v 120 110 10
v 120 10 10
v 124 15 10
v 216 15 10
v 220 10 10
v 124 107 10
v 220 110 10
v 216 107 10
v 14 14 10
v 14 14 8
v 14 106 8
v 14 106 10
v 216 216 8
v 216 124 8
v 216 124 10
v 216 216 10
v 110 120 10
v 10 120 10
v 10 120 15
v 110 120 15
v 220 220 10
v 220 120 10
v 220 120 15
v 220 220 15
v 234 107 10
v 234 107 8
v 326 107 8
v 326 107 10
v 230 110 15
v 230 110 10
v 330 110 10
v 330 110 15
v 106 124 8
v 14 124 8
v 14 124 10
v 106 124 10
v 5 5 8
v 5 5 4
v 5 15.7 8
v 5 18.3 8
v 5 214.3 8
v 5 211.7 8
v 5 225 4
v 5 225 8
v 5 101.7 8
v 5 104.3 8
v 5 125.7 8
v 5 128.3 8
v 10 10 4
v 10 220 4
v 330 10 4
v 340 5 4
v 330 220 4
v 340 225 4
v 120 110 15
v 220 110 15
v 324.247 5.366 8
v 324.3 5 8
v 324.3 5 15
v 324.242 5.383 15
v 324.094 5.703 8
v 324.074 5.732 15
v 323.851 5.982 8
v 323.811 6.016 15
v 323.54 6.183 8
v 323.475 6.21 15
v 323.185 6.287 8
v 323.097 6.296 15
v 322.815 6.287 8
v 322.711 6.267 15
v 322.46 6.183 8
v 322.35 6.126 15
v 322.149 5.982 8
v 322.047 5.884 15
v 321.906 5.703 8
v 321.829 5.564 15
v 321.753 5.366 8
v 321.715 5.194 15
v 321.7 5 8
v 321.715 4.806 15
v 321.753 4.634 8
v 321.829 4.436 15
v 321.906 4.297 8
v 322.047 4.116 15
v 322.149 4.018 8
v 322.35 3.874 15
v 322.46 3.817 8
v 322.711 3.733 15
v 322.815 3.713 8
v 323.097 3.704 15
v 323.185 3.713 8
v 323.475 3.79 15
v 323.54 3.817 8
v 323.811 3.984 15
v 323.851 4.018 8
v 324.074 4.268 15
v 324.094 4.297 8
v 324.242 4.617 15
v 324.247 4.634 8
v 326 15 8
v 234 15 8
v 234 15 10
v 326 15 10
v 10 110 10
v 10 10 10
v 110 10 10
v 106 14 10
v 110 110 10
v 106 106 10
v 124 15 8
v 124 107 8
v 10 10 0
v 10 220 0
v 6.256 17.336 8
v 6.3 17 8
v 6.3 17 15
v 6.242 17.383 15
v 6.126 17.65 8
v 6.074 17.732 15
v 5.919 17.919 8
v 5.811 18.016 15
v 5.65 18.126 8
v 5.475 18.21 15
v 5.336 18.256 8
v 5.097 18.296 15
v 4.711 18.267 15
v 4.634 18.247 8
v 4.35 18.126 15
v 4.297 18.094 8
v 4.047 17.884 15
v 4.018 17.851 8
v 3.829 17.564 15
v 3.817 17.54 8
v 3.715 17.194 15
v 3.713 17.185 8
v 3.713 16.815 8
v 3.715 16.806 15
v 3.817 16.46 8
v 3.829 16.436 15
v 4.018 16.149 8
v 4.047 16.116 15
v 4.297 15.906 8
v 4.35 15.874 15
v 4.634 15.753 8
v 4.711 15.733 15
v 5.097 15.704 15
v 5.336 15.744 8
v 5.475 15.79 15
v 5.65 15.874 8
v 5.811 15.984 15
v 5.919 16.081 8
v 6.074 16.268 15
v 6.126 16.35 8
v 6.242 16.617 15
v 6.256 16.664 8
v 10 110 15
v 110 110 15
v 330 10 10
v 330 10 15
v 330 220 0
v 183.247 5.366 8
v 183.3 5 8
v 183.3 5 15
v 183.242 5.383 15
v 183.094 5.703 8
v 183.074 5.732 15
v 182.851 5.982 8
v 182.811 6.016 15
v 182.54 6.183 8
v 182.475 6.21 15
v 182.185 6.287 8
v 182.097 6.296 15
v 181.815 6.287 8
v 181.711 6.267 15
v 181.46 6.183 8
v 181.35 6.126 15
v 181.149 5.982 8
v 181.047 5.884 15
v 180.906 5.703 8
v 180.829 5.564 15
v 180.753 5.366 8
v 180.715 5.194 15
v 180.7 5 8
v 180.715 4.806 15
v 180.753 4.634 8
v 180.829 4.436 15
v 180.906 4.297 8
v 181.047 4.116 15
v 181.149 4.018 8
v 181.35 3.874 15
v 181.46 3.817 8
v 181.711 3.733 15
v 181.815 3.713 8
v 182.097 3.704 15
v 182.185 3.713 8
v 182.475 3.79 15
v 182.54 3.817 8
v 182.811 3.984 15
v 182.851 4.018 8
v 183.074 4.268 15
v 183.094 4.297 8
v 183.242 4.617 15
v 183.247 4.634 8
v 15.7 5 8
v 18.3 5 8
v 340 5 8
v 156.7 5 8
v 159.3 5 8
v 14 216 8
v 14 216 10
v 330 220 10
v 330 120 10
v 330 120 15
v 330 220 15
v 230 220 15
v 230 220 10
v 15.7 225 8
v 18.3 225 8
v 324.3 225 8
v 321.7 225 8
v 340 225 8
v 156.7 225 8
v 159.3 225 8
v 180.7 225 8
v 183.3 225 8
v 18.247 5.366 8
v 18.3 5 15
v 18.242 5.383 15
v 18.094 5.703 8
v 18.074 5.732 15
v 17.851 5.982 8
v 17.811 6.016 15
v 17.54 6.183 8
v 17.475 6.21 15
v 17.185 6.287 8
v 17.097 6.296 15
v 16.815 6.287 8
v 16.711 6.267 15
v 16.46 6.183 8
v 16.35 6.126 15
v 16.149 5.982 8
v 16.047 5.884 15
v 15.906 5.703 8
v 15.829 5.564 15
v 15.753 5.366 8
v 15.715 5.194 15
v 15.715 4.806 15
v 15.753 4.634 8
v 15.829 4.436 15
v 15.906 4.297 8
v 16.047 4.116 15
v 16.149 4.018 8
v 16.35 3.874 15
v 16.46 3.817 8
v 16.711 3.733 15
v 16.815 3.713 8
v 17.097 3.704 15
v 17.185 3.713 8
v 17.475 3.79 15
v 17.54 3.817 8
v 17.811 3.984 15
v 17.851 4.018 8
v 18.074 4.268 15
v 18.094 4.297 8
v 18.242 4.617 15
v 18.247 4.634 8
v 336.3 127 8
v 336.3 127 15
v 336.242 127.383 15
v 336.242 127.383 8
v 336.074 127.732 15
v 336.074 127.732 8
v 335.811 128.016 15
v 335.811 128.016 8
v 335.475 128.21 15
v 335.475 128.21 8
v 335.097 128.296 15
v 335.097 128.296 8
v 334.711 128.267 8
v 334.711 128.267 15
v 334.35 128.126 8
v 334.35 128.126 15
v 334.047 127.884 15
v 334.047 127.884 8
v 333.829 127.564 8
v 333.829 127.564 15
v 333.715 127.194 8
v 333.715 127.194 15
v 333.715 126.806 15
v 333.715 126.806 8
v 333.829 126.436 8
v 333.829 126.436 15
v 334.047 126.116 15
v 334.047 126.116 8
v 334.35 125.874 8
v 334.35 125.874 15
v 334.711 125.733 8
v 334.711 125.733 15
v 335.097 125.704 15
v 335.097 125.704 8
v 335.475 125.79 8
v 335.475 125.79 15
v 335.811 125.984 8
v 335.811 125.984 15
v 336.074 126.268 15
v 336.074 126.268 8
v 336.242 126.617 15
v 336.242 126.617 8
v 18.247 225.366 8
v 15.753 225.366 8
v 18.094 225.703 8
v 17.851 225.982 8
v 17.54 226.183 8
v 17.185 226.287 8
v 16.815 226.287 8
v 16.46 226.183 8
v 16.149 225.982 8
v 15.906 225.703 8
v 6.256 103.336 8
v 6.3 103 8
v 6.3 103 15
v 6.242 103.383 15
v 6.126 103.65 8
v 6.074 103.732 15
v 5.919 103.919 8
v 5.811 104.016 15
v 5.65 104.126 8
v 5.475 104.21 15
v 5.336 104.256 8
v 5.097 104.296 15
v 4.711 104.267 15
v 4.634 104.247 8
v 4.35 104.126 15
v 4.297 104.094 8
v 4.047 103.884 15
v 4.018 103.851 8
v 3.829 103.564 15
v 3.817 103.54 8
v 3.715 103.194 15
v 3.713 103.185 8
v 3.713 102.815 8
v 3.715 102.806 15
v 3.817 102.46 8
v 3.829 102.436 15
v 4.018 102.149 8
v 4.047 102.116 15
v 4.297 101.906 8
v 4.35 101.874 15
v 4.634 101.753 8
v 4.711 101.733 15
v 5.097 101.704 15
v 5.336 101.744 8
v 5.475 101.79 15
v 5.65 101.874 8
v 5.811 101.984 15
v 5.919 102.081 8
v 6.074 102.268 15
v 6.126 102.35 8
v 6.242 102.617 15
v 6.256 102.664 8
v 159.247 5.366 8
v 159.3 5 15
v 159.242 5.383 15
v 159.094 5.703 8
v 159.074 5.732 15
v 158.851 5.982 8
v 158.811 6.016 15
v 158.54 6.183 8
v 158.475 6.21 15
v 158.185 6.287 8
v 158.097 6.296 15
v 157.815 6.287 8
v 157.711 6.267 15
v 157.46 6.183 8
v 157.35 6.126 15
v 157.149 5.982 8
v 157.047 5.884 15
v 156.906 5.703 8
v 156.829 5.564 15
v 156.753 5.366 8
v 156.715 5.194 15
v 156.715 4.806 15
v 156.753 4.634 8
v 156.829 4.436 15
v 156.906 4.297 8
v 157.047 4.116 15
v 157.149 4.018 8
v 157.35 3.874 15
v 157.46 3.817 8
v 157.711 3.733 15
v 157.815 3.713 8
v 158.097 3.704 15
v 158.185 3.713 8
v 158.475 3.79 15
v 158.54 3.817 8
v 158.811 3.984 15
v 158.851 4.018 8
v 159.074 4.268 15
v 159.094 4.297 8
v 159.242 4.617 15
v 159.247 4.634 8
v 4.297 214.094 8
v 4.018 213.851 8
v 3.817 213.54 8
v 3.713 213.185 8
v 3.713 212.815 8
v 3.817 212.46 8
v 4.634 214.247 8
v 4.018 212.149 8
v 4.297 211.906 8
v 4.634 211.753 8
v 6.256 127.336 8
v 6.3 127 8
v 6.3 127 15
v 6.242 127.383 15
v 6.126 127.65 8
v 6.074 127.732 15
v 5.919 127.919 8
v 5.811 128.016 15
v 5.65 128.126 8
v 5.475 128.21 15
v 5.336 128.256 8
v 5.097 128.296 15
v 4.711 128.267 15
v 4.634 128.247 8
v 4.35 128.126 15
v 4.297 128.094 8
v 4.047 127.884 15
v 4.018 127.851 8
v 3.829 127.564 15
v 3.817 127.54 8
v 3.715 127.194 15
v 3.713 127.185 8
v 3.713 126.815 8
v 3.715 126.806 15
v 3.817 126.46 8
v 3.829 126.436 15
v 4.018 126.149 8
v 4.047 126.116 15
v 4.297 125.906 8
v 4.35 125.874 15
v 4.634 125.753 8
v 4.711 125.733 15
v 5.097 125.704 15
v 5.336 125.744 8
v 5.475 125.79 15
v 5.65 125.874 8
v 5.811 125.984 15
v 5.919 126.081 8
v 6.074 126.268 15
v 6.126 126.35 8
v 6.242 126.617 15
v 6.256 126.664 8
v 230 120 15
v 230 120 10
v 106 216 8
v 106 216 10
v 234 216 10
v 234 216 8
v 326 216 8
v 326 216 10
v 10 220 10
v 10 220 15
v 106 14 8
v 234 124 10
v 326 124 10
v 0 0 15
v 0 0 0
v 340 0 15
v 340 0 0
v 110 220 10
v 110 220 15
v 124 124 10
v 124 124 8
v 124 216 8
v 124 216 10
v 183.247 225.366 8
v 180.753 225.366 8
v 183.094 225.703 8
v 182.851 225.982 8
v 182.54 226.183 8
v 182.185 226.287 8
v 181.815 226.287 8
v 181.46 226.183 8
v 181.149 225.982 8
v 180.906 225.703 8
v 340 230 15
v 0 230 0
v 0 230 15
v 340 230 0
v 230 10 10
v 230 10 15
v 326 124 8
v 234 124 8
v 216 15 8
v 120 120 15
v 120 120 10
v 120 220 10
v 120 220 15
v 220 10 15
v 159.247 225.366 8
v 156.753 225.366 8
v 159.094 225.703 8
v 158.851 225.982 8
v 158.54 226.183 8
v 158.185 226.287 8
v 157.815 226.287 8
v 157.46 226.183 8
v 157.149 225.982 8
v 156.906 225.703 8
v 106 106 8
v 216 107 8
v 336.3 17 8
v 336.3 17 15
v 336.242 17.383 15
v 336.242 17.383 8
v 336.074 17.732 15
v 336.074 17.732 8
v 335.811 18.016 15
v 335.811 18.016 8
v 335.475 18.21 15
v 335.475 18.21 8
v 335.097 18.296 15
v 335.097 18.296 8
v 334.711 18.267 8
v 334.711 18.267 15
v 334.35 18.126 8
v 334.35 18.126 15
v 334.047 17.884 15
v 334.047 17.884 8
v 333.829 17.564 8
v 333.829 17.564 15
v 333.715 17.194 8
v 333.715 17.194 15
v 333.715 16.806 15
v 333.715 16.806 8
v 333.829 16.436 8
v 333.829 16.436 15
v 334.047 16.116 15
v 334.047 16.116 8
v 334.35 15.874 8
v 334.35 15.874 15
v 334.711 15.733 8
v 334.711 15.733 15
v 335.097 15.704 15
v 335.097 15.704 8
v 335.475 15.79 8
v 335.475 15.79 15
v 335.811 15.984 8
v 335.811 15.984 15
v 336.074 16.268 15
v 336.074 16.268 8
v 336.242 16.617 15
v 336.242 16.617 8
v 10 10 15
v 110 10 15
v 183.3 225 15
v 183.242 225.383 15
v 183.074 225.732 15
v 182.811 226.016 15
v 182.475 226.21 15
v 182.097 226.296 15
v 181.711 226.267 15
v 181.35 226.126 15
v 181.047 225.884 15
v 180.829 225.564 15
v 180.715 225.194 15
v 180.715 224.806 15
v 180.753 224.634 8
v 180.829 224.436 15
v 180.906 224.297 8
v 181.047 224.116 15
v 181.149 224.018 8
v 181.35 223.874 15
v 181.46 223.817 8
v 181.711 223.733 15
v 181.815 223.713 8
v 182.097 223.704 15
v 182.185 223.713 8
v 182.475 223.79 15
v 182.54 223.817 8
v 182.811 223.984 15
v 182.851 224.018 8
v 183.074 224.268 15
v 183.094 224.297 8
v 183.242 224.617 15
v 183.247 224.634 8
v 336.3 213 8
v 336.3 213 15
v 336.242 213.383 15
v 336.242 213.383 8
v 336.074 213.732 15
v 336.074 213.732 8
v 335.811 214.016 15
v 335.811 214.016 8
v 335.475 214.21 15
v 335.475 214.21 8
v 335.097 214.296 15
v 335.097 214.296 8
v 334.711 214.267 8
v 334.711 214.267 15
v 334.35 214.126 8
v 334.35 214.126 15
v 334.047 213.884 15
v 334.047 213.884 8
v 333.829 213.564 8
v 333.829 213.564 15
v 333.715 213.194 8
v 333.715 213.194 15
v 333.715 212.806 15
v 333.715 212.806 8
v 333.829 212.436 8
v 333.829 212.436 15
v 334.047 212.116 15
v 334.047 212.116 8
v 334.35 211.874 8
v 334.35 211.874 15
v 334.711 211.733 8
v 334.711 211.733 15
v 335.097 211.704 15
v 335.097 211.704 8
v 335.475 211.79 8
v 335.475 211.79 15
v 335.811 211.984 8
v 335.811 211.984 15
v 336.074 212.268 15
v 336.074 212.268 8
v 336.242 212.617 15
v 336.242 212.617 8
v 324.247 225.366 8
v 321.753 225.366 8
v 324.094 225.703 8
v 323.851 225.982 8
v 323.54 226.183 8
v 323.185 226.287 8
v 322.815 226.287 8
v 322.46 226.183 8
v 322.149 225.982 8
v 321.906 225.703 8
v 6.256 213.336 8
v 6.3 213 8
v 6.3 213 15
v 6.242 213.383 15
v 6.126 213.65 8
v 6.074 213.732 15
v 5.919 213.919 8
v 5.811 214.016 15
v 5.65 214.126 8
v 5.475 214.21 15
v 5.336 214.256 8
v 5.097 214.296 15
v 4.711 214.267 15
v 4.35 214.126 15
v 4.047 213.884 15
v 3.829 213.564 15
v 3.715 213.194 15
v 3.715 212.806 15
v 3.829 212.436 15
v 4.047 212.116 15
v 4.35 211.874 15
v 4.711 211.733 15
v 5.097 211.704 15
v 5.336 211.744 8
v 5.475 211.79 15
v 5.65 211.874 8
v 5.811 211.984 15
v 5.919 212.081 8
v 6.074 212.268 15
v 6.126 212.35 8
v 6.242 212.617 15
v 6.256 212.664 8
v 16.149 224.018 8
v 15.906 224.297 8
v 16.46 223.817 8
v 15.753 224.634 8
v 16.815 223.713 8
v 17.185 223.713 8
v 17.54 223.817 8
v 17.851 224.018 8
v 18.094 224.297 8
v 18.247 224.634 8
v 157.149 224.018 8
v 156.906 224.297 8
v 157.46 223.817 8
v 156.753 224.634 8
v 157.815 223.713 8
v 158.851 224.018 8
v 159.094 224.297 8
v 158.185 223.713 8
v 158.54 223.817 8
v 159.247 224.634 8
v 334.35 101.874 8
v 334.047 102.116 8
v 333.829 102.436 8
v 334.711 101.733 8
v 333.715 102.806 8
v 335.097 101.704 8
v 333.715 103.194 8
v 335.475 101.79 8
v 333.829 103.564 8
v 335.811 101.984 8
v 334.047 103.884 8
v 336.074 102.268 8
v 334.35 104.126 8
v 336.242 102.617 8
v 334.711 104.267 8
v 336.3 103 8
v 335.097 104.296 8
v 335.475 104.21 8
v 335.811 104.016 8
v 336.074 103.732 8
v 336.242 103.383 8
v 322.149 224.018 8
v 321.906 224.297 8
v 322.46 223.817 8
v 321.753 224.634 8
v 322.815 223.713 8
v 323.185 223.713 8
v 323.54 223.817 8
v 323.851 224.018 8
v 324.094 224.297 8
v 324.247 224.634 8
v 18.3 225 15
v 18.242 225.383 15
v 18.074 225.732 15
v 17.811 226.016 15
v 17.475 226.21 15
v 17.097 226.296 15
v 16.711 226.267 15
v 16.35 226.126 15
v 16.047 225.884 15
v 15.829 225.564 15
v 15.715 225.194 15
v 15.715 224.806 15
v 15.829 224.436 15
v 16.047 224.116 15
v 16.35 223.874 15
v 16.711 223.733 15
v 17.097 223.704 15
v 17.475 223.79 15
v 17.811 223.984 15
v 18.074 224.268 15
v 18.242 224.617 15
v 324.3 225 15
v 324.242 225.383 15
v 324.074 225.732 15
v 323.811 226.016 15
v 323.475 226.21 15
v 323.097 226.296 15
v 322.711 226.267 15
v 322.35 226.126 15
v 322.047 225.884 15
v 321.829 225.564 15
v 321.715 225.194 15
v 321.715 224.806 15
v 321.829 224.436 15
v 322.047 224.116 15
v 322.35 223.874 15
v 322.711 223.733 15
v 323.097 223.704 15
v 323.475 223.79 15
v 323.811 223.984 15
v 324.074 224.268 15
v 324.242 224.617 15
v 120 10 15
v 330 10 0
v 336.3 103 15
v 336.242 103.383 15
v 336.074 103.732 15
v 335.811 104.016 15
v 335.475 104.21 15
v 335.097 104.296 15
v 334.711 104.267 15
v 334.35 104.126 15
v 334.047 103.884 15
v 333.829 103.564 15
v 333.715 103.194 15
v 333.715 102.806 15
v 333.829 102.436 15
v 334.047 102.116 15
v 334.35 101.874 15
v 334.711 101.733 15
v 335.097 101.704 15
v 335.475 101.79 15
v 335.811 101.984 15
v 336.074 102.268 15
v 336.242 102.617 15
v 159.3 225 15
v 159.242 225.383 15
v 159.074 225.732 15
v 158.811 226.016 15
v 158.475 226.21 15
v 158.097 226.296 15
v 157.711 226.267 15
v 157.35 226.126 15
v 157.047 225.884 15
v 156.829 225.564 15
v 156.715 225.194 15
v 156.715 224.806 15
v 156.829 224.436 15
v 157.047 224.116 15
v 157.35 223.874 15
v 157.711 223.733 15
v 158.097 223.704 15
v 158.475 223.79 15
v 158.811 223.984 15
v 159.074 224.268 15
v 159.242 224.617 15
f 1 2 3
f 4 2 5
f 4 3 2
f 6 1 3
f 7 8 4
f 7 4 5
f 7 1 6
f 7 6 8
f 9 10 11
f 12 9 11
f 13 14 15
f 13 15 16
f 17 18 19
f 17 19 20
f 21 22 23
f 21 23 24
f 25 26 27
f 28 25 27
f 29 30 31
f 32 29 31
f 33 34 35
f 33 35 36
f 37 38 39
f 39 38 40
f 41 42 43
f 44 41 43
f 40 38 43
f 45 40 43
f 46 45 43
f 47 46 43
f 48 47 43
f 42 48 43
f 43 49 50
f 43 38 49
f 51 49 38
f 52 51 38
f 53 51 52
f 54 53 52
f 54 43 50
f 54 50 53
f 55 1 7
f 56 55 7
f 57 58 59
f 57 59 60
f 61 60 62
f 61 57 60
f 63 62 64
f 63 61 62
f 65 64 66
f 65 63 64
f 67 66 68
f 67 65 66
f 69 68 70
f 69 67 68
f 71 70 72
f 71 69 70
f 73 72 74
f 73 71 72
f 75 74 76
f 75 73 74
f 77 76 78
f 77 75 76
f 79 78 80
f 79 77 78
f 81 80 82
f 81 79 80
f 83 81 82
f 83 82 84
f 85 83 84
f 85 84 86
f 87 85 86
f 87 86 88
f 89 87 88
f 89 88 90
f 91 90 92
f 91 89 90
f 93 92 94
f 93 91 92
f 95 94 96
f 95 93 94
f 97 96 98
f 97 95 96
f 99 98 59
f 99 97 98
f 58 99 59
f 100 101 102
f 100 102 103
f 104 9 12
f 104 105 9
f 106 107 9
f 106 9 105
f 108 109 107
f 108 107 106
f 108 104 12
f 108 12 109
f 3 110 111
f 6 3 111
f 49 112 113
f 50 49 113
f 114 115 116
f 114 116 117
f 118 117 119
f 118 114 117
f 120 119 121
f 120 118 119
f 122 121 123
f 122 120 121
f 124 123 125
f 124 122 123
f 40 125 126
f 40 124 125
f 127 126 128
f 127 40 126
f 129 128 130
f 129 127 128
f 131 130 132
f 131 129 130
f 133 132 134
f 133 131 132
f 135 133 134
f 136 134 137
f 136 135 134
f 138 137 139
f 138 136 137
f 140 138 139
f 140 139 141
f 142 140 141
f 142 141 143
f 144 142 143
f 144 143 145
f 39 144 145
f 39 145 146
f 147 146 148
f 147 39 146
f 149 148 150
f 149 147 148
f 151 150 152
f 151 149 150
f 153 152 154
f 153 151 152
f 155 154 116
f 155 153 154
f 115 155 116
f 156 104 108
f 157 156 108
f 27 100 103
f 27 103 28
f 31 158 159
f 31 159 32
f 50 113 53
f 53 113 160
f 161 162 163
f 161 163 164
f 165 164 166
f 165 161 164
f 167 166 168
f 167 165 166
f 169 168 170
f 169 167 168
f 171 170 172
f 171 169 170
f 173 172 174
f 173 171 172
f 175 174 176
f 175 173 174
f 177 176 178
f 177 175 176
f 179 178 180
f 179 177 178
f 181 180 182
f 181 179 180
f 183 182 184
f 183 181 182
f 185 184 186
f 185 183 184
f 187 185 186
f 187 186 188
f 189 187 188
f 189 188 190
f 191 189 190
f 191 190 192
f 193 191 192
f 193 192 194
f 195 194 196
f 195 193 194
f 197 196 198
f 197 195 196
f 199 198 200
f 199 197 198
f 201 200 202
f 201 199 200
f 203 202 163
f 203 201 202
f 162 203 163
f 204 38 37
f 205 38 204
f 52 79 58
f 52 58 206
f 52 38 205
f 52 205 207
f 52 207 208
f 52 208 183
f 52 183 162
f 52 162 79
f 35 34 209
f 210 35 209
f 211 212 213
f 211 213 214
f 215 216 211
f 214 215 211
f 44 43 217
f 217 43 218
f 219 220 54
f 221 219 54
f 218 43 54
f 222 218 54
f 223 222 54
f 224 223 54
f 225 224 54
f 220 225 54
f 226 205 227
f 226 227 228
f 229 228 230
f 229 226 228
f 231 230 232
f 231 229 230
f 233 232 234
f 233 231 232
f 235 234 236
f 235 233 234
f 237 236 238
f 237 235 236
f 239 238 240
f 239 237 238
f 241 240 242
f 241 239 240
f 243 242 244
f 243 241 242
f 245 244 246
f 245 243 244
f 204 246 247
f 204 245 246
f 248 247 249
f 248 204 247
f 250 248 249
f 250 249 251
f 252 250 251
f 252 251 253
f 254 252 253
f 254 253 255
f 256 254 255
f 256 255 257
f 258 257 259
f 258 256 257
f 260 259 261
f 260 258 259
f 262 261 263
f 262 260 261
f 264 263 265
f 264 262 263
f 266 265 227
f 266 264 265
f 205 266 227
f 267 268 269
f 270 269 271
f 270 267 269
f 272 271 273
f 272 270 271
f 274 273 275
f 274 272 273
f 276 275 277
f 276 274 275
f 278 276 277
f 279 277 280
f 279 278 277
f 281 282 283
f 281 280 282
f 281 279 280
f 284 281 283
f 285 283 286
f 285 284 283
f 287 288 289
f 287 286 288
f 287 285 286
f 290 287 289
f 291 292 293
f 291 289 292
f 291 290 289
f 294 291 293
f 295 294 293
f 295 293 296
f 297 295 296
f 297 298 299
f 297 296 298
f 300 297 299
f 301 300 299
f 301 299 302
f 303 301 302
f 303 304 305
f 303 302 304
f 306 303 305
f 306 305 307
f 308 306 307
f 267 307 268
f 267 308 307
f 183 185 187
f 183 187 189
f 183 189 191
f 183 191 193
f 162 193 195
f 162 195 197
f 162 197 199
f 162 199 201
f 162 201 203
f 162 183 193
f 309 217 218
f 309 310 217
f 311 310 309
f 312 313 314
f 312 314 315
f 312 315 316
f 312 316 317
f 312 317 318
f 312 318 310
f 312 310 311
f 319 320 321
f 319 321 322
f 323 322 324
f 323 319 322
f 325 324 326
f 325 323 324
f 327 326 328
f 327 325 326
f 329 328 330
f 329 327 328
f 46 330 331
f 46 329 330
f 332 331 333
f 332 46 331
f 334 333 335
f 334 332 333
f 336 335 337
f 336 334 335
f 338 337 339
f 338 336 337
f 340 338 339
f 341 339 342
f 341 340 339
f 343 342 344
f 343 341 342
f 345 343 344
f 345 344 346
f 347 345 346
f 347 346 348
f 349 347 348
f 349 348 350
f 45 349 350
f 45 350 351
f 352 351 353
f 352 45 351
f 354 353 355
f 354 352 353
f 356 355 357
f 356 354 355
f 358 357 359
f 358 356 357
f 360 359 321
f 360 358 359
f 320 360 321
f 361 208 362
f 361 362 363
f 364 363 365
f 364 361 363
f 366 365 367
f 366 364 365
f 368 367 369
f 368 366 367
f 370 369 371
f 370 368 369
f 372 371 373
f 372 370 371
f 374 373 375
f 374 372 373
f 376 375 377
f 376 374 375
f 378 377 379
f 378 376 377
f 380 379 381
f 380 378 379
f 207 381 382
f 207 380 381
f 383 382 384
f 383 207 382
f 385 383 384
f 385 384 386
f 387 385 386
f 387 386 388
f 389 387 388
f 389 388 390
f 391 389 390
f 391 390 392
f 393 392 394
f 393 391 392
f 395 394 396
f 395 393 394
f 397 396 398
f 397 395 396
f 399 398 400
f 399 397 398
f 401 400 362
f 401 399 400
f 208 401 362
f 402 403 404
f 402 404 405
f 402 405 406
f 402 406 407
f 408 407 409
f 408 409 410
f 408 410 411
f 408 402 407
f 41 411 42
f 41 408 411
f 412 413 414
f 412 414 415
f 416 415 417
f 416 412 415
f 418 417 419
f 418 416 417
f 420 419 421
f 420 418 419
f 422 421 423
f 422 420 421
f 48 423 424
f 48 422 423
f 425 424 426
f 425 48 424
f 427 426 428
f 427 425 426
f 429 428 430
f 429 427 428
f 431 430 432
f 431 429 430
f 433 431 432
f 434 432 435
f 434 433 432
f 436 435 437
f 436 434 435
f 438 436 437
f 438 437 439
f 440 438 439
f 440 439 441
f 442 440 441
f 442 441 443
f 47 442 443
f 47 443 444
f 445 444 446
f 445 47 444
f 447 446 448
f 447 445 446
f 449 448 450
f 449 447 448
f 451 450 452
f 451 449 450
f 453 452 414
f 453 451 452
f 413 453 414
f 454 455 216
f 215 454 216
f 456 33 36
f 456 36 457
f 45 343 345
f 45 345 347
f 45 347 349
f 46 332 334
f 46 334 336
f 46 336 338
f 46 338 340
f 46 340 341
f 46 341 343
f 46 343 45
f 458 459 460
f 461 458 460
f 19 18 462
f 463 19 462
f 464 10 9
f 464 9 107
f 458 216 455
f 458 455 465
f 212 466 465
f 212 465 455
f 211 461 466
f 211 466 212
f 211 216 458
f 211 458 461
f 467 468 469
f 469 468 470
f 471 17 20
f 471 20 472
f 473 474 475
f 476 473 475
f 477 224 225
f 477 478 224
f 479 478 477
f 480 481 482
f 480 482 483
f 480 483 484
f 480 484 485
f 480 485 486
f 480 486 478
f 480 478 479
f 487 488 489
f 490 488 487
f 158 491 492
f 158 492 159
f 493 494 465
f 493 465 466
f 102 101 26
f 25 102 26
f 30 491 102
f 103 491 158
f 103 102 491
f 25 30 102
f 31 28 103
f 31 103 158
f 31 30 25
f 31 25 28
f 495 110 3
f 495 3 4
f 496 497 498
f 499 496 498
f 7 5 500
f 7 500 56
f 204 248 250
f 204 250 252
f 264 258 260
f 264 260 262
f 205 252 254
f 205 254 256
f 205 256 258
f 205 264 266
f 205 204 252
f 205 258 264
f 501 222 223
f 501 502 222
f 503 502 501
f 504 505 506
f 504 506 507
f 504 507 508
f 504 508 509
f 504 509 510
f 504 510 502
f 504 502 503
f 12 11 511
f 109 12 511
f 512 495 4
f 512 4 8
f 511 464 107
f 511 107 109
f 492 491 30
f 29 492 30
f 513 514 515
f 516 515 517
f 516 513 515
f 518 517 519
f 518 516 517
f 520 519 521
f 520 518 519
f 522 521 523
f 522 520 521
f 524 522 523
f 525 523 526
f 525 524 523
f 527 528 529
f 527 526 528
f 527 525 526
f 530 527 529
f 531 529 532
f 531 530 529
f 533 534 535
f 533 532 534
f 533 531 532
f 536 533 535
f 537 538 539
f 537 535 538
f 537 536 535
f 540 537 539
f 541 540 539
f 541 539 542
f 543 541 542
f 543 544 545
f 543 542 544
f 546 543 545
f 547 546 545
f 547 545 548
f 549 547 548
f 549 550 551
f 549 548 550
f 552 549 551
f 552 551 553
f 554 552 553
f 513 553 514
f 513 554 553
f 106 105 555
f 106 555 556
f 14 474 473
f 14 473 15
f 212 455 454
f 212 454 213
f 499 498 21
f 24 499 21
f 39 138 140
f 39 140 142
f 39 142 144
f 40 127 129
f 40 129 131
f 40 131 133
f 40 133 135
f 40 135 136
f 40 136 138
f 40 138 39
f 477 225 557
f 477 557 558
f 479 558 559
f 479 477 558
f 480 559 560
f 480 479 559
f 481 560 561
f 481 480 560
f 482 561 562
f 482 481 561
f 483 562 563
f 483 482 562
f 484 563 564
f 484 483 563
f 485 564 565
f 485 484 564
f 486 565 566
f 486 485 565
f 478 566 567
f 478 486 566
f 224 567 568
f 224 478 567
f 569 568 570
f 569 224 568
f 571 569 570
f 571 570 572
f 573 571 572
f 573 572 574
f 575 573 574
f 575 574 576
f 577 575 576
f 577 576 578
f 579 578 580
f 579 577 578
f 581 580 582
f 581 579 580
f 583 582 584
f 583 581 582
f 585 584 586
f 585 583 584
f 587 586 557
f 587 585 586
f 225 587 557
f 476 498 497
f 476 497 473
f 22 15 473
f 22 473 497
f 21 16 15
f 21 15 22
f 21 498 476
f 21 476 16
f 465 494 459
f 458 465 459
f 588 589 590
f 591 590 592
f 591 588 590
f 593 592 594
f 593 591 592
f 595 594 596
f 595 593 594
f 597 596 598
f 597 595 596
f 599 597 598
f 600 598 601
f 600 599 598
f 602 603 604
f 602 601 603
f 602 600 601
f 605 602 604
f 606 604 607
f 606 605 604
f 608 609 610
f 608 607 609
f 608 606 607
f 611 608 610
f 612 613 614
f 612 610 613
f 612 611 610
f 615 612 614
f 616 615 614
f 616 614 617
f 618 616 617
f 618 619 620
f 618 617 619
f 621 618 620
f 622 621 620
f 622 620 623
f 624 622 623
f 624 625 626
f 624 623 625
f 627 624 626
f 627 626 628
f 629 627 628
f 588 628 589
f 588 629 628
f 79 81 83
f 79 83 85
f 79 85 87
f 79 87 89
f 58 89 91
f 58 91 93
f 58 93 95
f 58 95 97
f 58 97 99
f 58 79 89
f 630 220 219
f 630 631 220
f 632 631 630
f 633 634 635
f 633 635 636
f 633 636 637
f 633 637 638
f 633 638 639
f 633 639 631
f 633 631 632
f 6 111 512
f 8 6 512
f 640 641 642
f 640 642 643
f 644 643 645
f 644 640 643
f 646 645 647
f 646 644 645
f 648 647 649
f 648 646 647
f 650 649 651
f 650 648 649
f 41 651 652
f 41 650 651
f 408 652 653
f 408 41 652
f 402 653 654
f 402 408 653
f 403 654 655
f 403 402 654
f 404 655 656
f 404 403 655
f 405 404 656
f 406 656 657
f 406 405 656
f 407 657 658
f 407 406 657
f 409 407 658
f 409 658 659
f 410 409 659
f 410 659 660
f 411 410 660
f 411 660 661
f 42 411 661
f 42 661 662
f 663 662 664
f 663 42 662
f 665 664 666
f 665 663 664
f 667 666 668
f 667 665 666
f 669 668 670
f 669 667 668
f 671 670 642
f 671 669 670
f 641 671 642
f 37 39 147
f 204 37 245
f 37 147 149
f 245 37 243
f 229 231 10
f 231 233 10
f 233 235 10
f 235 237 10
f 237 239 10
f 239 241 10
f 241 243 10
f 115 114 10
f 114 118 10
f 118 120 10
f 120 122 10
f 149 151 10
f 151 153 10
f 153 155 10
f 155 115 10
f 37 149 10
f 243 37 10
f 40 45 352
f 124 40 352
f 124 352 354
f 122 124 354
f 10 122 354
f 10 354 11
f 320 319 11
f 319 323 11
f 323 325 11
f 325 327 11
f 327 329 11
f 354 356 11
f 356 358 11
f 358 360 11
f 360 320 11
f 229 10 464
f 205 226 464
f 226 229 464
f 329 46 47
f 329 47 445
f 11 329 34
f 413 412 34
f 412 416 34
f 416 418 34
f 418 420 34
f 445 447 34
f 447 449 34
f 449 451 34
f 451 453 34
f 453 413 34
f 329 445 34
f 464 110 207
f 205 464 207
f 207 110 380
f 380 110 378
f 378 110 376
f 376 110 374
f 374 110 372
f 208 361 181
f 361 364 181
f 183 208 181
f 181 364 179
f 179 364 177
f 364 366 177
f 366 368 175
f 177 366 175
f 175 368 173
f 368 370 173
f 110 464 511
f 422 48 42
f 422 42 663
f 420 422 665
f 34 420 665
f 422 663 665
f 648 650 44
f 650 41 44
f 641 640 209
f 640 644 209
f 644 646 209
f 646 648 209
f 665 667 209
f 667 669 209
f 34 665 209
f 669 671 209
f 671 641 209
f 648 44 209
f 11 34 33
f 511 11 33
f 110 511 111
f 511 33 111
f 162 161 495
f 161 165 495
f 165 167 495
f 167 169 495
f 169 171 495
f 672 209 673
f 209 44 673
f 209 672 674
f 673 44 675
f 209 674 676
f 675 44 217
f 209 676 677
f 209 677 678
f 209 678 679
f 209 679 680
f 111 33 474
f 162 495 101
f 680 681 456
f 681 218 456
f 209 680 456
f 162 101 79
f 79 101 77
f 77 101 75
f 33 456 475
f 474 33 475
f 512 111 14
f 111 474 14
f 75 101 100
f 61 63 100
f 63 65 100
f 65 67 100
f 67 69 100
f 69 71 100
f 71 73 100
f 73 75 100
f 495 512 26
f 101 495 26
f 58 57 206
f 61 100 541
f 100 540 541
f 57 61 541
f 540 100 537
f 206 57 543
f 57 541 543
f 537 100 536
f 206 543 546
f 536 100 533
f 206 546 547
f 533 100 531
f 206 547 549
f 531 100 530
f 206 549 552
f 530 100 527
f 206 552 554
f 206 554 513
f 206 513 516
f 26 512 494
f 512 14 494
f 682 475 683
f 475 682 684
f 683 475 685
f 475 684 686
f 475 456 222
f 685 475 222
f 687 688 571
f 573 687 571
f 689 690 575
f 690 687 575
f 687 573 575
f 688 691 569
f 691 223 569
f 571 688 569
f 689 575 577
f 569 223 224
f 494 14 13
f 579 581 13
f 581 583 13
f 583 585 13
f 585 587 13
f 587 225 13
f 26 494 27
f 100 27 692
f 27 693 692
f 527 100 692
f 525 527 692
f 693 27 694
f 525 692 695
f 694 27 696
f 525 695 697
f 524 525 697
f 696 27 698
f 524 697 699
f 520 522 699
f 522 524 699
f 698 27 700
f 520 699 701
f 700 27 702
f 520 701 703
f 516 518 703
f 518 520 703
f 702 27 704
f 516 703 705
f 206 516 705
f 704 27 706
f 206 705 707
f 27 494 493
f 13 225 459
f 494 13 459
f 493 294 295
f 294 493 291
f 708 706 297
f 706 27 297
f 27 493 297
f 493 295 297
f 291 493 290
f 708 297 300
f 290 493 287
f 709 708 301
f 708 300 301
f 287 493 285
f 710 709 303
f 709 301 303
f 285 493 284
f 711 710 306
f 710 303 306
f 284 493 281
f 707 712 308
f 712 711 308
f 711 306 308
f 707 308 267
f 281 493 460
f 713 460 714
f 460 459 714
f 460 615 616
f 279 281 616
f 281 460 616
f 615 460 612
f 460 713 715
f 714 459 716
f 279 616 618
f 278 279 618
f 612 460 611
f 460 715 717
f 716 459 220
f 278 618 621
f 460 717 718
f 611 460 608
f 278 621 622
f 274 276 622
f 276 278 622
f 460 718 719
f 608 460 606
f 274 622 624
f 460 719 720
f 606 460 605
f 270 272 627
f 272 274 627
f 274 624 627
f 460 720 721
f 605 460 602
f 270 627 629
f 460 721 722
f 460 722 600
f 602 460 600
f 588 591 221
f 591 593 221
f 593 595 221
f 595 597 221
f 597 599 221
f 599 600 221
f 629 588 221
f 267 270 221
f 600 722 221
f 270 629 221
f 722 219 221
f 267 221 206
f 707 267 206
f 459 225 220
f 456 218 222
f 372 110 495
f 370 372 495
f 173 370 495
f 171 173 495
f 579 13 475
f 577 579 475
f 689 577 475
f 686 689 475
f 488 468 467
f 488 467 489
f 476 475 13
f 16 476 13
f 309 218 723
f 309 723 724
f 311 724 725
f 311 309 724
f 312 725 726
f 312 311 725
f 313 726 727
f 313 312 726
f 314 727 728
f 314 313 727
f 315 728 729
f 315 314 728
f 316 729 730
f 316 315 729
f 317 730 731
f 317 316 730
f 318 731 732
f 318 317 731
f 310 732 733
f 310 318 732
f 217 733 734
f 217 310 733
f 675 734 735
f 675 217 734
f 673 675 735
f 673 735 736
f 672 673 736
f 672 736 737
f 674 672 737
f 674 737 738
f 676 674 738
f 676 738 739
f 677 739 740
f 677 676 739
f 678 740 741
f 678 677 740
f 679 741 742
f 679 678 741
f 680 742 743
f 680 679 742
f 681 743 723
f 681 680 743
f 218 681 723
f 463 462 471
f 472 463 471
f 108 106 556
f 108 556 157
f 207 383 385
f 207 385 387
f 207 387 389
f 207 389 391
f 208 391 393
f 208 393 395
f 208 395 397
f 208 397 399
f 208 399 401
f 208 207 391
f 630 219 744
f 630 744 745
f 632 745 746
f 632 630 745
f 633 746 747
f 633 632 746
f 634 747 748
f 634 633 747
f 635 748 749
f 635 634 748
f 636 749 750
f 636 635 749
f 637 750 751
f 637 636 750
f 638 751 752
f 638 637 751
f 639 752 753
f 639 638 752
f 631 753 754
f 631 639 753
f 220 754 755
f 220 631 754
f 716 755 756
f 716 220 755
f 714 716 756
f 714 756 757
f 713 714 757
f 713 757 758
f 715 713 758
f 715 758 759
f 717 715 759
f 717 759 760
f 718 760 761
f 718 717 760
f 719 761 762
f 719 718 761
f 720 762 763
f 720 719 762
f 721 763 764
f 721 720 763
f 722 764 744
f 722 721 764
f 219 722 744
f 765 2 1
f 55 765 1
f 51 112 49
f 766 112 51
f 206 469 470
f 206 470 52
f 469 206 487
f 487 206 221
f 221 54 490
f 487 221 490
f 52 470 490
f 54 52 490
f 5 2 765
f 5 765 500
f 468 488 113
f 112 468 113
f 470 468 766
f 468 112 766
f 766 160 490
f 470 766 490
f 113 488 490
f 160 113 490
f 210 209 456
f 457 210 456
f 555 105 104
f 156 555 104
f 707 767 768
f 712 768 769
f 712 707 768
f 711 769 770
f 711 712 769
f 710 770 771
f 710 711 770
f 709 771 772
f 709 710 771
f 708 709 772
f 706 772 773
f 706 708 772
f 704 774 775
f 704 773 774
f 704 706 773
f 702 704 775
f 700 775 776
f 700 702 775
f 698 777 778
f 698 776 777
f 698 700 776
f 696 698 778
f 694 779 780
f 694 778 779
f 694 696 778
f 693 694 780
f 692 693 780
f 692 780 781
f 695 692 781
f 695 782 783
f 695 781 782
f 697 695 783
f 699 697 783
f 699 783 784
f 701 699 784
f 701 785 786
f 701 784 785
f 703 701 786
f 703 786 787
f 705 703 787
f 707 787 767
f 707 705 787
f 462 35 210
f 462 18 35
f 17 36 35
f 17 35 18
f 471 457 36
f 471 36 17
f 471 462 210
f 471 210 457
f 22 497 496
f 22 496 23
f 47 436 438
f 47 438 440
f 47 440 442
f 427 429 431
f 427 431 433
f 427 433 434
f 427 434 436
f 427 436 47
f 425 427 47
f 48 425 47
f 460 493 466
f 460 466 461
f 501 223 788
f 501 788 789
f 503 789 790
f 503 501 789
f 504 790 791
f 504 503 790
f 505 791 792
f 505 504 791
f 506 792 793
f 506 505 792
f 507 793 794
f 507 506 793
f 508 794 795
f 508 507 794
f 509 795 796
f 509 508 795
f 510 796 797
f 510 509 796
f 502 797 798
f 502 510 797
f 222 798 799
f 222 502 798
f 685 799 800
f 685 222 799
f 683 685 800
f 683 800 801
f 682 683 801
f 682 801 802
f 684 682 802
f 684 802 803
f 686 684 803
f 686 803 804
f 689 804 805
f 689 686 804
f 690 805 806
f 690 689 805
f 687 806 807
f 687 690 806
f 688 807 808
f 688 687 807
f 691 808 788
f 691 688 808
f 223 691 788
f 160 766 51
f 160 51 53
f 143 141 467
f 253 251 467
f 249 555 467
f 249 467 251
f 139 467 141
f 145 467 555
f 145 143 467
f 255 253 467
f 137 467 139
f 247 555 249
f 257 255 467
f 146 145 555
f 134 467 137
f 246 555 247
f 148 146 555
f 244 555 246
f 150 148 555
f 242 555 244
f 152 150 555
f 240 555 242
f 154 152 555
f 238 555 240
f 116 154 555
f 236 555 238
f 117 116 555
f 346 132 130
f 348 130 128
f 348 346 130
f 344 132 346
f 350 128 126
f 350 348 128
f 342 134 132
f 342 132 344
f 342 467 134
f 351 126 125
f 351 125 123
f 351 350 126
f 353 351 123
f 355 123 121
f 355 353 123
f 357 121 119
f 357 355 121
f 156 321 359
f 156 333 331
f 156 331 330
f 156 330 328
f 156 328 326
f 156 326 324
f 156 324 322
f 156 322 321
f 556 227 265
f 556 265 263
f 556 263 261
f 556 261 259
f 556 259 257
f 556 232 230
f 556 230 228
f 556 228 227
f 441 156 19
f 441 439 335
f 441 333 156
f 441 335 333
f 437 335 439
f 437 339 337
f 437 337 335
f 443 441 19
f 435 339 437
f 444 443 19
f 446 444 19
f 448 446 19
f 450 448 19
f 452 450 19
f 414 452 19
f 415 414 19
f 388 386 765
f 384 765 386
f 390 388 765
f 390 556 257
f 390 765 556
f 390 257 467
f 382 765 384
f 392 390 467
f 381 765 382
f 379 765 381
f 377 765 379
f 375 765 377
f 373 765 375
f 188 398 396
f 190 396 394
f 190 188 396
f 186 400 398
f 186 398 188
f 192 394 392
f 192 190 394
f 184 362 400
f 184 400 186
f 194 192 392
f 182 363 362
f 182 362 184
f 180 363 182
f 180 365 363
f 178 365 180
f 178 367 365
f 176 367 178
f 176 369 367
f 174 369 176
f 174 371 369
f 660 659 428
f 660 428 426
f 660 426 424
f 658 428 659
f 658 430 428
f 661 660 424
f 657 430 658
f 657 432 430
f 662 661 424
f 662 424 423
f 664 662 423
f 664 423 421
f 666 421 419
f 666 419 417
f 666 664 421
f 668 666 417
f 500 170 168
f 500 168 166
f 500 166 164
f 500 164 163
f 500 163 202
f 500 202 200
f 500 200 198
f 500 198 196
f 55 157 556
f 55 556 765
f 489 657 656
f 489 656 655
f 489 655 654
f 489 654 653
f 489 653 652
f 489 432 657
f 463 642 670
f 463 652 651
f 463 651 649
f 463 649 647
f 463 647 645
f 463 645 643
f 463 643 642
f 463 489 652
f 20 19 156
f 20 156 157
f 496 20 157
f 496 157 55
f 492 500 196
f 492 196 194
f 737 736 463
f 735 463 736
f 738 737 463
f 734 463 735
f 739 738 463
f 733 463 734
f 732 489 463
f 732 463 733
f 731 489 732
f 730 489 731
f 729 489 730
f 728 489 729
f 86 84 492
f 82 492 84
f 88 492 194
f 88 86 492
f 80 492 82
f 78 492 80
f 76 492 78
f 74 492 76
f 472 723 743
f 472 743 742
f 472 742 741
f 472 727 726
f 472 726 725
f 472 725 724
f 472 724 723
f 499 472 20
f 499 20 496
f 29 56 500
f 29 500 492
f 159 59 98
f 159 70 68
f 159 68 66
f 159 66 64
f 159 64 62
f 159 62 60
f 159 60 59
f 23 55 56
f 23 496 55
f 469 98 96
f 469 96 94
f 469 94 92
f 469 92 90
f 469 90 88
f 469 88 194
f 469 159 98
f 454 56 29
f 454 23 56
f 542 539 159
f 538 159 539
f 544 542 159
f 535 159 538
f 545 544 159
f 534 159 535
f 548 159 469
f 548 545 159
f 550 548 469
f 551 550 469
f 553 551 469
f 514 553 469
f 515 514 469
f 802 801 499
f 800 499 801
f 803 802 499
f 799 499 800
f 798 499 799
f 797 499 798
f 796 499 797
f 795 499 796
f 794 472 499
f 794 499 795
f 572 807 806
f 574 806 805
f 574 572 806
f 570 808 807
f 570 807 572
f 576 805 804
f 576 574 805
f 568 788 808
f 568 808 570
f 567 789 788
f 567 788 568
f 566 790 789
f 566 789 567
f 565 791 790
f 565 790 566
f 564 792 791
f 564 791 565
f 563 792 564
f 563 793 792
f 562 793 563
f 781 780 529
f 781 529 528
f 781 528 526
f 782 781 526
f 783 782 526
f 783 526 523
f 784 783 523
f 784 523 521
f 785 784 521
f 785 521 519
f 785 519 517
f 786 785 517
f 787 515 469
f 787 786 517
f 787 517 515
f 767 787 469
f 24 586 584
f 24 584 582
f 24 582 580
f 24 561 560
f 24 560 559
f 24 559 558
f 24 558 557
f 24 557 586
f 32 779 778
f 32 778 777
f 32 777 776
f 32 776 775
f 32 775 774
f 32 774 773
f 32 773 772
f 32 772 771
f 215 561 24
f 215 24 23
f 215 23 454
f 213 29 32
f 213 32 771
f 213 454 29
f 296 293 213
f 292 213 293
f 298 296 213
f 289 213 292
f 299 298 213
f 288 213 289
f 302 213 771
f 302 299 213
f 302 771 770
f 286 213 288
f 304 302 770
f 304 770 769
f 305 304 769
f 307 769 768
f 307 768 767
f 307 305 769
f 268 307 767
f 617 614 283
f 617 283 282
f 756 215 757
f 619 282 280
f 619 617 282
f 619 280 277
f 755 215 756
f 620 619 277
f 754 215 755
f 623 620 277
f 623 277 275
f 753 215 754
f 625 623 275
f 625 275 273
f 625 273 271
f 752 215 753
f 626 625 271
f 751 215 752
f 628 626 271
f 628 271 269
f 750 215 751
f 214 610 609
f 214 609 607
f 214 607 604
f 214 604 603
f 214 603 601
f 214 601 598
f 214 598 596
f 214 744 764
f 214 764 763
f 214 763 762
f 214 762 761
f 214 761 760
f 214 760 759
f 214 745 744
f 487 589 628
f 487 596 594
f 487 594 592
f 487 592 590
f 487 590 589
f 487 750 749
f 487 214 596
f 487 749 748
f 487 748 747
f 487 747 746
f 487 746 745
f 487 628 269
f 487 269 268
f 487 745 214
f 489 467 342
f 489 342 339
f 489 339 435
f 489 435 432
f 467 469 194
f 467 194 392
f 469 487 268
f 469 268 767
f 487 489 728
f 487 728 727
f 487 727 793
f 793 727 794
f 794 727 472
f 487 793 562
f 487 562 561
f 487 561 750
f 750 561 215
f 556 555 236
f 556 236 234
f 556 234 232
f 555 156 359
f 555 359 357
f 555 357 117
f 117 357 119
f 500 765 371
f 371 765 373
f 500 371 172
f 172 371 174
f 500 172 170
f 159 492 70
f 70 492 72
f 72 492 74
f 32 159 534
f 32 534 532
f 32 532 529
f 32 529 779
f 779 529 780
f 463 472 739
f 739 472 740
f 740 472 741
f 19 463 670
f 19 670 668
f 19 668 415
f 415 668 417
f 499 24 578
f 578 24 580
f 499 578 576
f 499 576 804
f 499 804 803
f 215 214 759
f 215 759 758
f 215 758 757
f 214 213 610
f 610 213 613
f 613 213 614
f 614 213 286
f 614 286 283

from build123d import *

# Parameters (mm, degrees)
CYLINDER050_R     = 1.3
CYLINDER050_DEPTH = 146
CYLINDER049_R     = 1.3
CYLINDER049_DEPTH = 146
CYLINDER042_R     = 1.3
CYLINDER042_DEPTH = 146
CYLINDER041_R     = 1.3
CYLINDER041_DEPTH = 146
CYLINDER038_R     = 1.3
CYLINDER038_DEPTH = 146
CYLINDER037_R     = 1.3
CYLINDER037_DEPTH = 146
CYLINDER035_R     = 1.3
CYLINDER035_DEPTH = 146
CYLINDER033_R     = 1.3
CYLINDER033_DEPTH = 146
CYLINDER031_R     = 1.3
CYLINDER031_DEPTH = 146
CYLINDER029_R     = 1.3
CYLINDER029_DEPTH = 146
CYLINDER016_R     = 1.3
CYLINDER016_DEPTH = 146
CYLINDER015_R     = 1.3
CYLINDER015_DEPTH = 146
CYLINDER006_R     = 1.3
CYLINDER006_DEPTH = 146
CYLINDER007_R     = 1.3
CYLINDER007_DEPTH = 146
CYLINDER003_R     = 1.3
CYLINDER003_DEPTH = 146
CYLINDER005_R     = 1.3
CYLINDER005_DEPTH = 146
BOX021_W          = 92
BOX021_H          = 92
BOX021_DEPTH      = 24
BOX020_W          = 92
BOX020_H          = 92
BOX020_DEPTH      = 24
BOX019_W          = 92
BOX019_H          = 92
BOX019_DEPTH      = 24
BOX018_W          = 92
BOX018_H          = 92
BOX018_DEPTH      = 24
BOX017_W          = 92
BOX017_H          = 92
BOX017_DEPTH      = 24
BOX013_W          = 92
BOX013_H          = 92
BOX013_DEPTH      = 24
BOX004_W          = 320
BOX004_H          = 210
BOX004_DEPTH      = 2
BOX015_W          = 335
BOX015_H          = 220
BOX015_DEPTH      = 4
BOX012_W          = 10
BOX012_H          = 210
BOX012_DEPTH      = 7
BOX006_W          = 340
BOX006_H          = 10
BOX006_DEPTH      = 7
BOX003_W          = 10
BOX003_H          = 210
BOX003_DEPTH      = 15
BOX002_W          = 10
BOX002_H          = 210
BOX002_DEPTH      = 15
BOX001_W          = 340
BOX001_H          = 10
BOX001_DEPTH      = 15
BOX_W             = 340
BOX_H             = 10
BOX_DEPTH         = 15
BOX011_W          = 10
BOX011_H          = 210
BOX011_DEPTH      = 7


with BuildPart() as cilindro050:
    # Cylinder050 → Cylinder050 (new body)
    with BuildSketch(Plane(origin=(5, 103, 8), x_dir=(1, 0, 0), z_dir=(0, 0, 1))):
        Circle(CYLINDER050_R)
    extrude(amount=CYLINDER050_DEPTH)


with BuildPart() as cilindro049:
    # Cylinder049 → Cylinder049 (new body)
    with BuildSketch(Plane(origin=(5, 127, 8), x_dir=(1, 0, 0), z_dir=(0, 0, 1))):
        Circle(CYLINDER049_R)
    extrude(amount=CYLINDER049_DEPTH)


with BuildPart() as cilindro042:
    # Cylinder042 → Cylinder042 (new body)
    with BuildSketch(Plane(origin=(5, 213, 8), x_dir=(1, 0, 0), z_dir=(0, 0, 1))):
        Circle(CYLINDER042_R)
    extrude(amount=CYLINDER042_DEPTH)


with BuildPart() as cilindro041:
    # Cylinder041 → Cylinder041 (new body)
    with BuildSketch(Plane(origin=(17, 225, 8), x_dir=(1, 0, 0), z_dir=(0, 0, 1))):
        Circle(CYLINDER041_R)
    extrude(amount=CYLINDER041_DEPTH)


with BuildPart() as cilindro038:
    # Cylinder038 → Cylinder038 (new body)
    with BuildSketch(Plane(origin=(158, 225, 8), x_dir=(1, 0, 0), z_dir=(0, 0, 1))):
        Circle(CYLINDER038_R)
    extrude(amount=CYLINDER038_DEPTH)


with BuildPart() as cilindro037:
    # Cylinder037 → Cylinder037 (new body)
    with BuildSketch(Plane(origin=(182, 225, 8), x_dir=(1, 0, 0), z_dir=(0, 0, 1))):
        Circle(CYLINDER037_R)
    extrude(amount=CYLINDER037_DEPTH)


with BuildPart() as cilindro035:
    # Cylinder035 → Cylinder035 (new body)
    with BuildSketch(Plane(origin=(323, 225, 8), x_dir=(1, 0, 0), z_dir=(0, 0, 1))):
        Circle(CYLINDER035_R)
    extrude(amount=CYLINDER035_DEPTH)


with BuildPart() as cilindro033:
    # Cylinder033 → Cylinder033 (new body)
    with BuildSketch(Plane(origin=(335, 213, 8), x_dir=(1, 0, 0), z_dir=(0, 0, 1))):
        Circle(CYLINDER033_R)
    extrude(amount=CYLINDER033_DEPTH)


with BuildPart() as cilindro031:
    # Cylinder031 → Cylinder031 (new body)
    with BuildSketch(Plane(origin=(335, 127, 8), x_dir=(1, 0, 0), z_dir=(0, 0, 1))):
        Circle(CYLINDER031_R)
    extrude(amount=CYLINDER031_DEPTH)


with BuildPart() as cilindro029:
    # Cylinder029 → Cylinder029 (new body)
    with BuildSketch(Plane(origin=(335, 103, 8), x_dir=(1, 0, 0), z_dir=(0, 0, 1))):
        Circle(CYLINDER029_R)
    extrude(amount=CYLINDER029_DEPTH)


with BuildPart() as cilindro016:
    # Cylinder016 → Cylinder016 (new body)
    with BuildSketch(Plane(origin=(335, 17, 8), x_dir=(1, 0, 0), z_dir=(0, 0, 1))):
        Circle(CYLINDER016_R)
    extrude(amount=CYLINDER016_DEPTH)


with BuildPart() as cilindro015:
    # Cylinder015 → Cylinder015 (new body)
    with BuildSketch(Plane(origin=(323, 5, 8), x_dir=(1, 0, 0), z_dir=(0, 0, 1))):
        Circle(CYLINDER015_R)
    extrude(amount=CYLINDER015_DEPTH)


with BuildPart() as cilindro006:
    # Cylinder006 → Cylinder006 (new body)
    with BuildSketch(Plane(origin=(182, 5, 8), x_dir=(1, 0, 0), z_dir=(0, 0, 1))):
        Circle(CYLINDER006_R)
    extrude(amount=CYLINDER006_DEPTH)


with BuildPart() as cilindro007:
    # Cylinder007 → Cylinder007 (new body)
    with BuildSketch(Plane(origin=(158, 5, 8), x_dir=(1, 0, 0), z_dir=(0, 0, 1))):
        Circle(CYLINDER007_R)
    extrude(amount=CYLINDER007_DEPTH)


with BuildPart() as cilindro003:
    # Cylinder003 → Cylinder003 (new body)
    with BuildSketch(Plane(origin=(17, 5, 8), x_dir=(1, 0, 0), z_dir=(0, 0, 1))):
        Circle(CYLINDER003_R)
    extrude(amount=CYLINDER003_DEPTH)


with BuildPart() as cilindro005:
    # Cylinder005 → Cylinder005 (new body)
    with BuildSketch(Plane(origin=(5, 17, 8), x_dir=(1, 0, 0), z_dir=(0, 0, 1))):
        Circle(CYLINDER005_R)
    extrude(amount=CYLINDER005_DEPTH)


with BuildPart() as cajita015:
    # Box021 → Box021 (new body)
    with BuildSketch(Plane(origin=(14, 124, 0), x_dir=(1, 0, 0), z_dir=(0, 0, 1))):
        with Locations((46, 46)):
            Rectangle(BOX021_W, BOX021_H)
    extrude(amount=BOX021_DEPTH)


with BuildPart() as cajita014:
    # Box020 → Box020 (new body)
    with BuildSketch(Plane(origin=(124, 124, 0), x_dir=(1, 0, 0), z_dir=(0, 0, 1))):
        with Locations((46, 46)):
            Rectangle(BOX020_W, BOX020_H)
    extrude(amount=BOX020_DEPTH)


with BuildPart() as cajita013:
    # Box019 → Box019 (new body)
    with BuildSketch(Plane(origin=(234, 124, 0), x_dir=(1, 0, 0), z_dir=(0, 0, 1))):
        with Locations((46, 46)):
            Rectangle(BOX019_W, BOX019_H)
    extrude(amount=BOX019_DEPTH)


with BuildPart() as cajita012:
    # Box018 → Box018 (new body)
    with BuildSketch(Plane(origin=(234, 15, 0), x_dir=(1, 0, 0), z_dir=(0, 0, 1))):
        with Locations((46, 46)):
            Rectangle(BOX018_W, BOX018_H)
    extrude(amount=BOX018_DEPTH)


with BuildPart() as cajita011:
    # Box017 → Box017 (new body)
    with BuildSketch(Plane(origin=(124, 15, 0), x_dir=(1, 0, 0), z_dir=(0, 0, 1))):
        with Locations((46, 46)):
            Rectangle(BOX017_W, BOX017_H)
    extrude(amount=BOX017_DEPTH)


with BuildPart() as cajita007:
    # Box013 → Box013 (new body)
    with BuildSketch(Plane(origin=(14, 14, 0), x_dir=(1, 0, 0), z_dir=(0, 0, 1))):
        with Locations((46, 46)):
            Rectangle(BOX013_W, BOX013_H)
    extrude(amount=BOX013_DEPTH)


with BuildPart() as cajita1:
    # Box004 → Box004 (new body)
    with BuildSketch(Plane(origin=(10, 10, 8), x_dir=(1, 0, 0), z_dir=(0, 0, 1))):
        with Locations((160, 105)):
            Rectangle(BOX004_W, BOX004_H)
    extrude(amount=BOX004_DEPTH)


with BuildPart() as cajita009:
    # Box015 → Box015 (new body)
    with BuildSketch(Plane(origin=(5, 5, 4), x_dir=(1, 0, 0), z_dir=(0, 0, 1))):
        with Locations((167.5, 110)):
            Rectangle(BOX015_W, BOX015_H)
    extrude(amount=BOX015_DEPTH)


with BuildPart() as ancho003:
    # Box012 → Box012 (new body)
    with BuildSketch(Plane(origin=(220, 10, 8), x_dir=(1, 0, 0), z_dir=(0, 0, 1))):
        with Locations((5, 105)):
            Rectangle(BOX012_W, BOX012_H)
    extrude(amount=BOX012_DEPTH)


with BuildPart() as base003:
    # Box006 → Box006 (new body)
    with BuildSketch(Plane(origin=(0, 110, 8), x_dir=(1, 0, 0), z_dir=(0, 0, 1))):
        with Locations((170, 5)):
            Rectangle(BOX006_W, BOX006_H)
    extrude(amount=BOX006_DEPTH)


with BuildPart() as ancho001:
    # Box003 → Box003 (new body)
    with BuildSketch(Plane(origin=(330, 10, 0), x_dir=(1, 0, 0), z_dir=(0, 0, 1))):
        with Locations((5, 105)):
            Rectangle(BOX003_W, BOX003_H)
    extrude(amount=BOX003_DEPTH)


with BuildPart() as ancho:
    # Box002 → Box002 (new body)
    with BuildSketch(Plane(origin=(0, 10, 0), x_dir=(1, 0, 0), z_dir=(0, 0, 1))):
        with Locations((5, 105)):
            Rectangle(BOX002_W, BOX002_H)
    extrude(amount=BOX002_DEPTH)


with BuildPart() as base2:
    # Box001 → Box001 (new body)
    with BuildSketch(Plane(origin=(0, 220, 0), x_dir=(1, 0, 0), z_dir=(0, 0, 1))):
        with Locations((170, 5)):
            Rectangle(BOX001_W, BOX001_H)
    extrude(amount=BOX001_DEPTH)


with BuildPart() as base1:
    # Box → Box (new body)
    with BuildSketch(Plane.XY):
        with Locations((170, 5)):
            Rectangle(BOX_W, BOX_H)
    extrude(amount=BOX_DEPTH)


with BuildPart() as cut065:
    # Box011 → Box011 (new body)
    with BuildSketch(Plane(origin=(110, 10, 8), x_dir=(1, 0, 0), z_dir=(0, 0, 1))):
        with Locations((5, 105)):
            Rectangle(BOX011_W, BOX011_H)
    extrude(amount=BOX011_DEPTH)

    # Fusion: union ancho003, base003, ancho001, ancho, base2, base1
    add(ancho003.part)
    add(base003.part)
    add(ancho001.part)
    add(ancho.part)
    add(base2.part)
    add(base1.part)

    # Cut: cut cajita009
    add(cajita009.part, mode=Mode.SUBTRACT)

    # Fusion001: union cajita1
    add(cajita1.part)

    # Cut001: cut cajita007
    add(cajita007.part, mode=Mode.SUBTRACT)

    # Cut002: cut cajita011
    add(cajita011.part, mode=Mode.SUBTRACT)

    # Cut003: cut cajita012
    add(cajita012.part, mode=Mode.SUBTRACT)

    # Cut004: cut cajita013
    add(cajita013.part, mode=Mode.SUBTRACT)

    # Cut005: cut cajita014
    add(cajita014.part, mode=Mode.SUBTRACT)

    # Cut006: cut cajita015
    add(cajita015.part, mode=Mode.SUBTRACT)

    # Cut019: cut Cilindro005
    add(cilindro005.part, mode=Mode.SUBTRACT)

    # Cut020: cut Cilindro003
    add(cilindro003.part, mode=Mode.SUBTRACT)

    # Cut021: cut Cilindro007
    add(cilindro007.part, mode=Mode.SUBTRACT)

    # Cut024: cut Cilindro006
    add(cilindro006.part, mode=Mode.SUBTRACT)

    # Cut030: cut Cilindro015
    add(cilindro015.part, mode=Mode.SUBTRACT)

    # Cut031: cut Cilindro016
    add(cilindro016.part, mode=Mode.SUBTRACT)

    # Cut044: cut Cilindro029
    add(cilindro029.part, mode=Mode.SUBTRACT)

    # Cut046: cut Cilindro031
    add(cilindro031.part, mode=Mode.SUBTRACT)

    # Cut048: cut Cilindro033
    add(cilindro033.part, mode=Mode.SUBTRACT)

    # Cut050: cut Cilindro035
    add(cilindro035.part, mode=Mode.SUBTRACT)

    # Cut052: cut Cilindro037
    add(cilindro037.part, mode=Mode.SUBTRACT)

    # Cut053: cut Cilindro038
    add(cilindro038.part, mode=Mode.SUBTRACT)

    # Cut056: cut Cilindro041
    add(cilindro041.part, mode=Mode.SUBTRACT)

    # Cut057: cut Cilindro042
    add(cilindro042.part, mode=Mode.SUBTRACT)

    # Cut064: cut Cilindro049
    add(cilindro049.part, mode=Mode.SUBTRACT)

    # Cut065: cut Cilindro050
    add(cilindro050.part, mode=Mode.SUBTRACT)


solid = cut065.part
